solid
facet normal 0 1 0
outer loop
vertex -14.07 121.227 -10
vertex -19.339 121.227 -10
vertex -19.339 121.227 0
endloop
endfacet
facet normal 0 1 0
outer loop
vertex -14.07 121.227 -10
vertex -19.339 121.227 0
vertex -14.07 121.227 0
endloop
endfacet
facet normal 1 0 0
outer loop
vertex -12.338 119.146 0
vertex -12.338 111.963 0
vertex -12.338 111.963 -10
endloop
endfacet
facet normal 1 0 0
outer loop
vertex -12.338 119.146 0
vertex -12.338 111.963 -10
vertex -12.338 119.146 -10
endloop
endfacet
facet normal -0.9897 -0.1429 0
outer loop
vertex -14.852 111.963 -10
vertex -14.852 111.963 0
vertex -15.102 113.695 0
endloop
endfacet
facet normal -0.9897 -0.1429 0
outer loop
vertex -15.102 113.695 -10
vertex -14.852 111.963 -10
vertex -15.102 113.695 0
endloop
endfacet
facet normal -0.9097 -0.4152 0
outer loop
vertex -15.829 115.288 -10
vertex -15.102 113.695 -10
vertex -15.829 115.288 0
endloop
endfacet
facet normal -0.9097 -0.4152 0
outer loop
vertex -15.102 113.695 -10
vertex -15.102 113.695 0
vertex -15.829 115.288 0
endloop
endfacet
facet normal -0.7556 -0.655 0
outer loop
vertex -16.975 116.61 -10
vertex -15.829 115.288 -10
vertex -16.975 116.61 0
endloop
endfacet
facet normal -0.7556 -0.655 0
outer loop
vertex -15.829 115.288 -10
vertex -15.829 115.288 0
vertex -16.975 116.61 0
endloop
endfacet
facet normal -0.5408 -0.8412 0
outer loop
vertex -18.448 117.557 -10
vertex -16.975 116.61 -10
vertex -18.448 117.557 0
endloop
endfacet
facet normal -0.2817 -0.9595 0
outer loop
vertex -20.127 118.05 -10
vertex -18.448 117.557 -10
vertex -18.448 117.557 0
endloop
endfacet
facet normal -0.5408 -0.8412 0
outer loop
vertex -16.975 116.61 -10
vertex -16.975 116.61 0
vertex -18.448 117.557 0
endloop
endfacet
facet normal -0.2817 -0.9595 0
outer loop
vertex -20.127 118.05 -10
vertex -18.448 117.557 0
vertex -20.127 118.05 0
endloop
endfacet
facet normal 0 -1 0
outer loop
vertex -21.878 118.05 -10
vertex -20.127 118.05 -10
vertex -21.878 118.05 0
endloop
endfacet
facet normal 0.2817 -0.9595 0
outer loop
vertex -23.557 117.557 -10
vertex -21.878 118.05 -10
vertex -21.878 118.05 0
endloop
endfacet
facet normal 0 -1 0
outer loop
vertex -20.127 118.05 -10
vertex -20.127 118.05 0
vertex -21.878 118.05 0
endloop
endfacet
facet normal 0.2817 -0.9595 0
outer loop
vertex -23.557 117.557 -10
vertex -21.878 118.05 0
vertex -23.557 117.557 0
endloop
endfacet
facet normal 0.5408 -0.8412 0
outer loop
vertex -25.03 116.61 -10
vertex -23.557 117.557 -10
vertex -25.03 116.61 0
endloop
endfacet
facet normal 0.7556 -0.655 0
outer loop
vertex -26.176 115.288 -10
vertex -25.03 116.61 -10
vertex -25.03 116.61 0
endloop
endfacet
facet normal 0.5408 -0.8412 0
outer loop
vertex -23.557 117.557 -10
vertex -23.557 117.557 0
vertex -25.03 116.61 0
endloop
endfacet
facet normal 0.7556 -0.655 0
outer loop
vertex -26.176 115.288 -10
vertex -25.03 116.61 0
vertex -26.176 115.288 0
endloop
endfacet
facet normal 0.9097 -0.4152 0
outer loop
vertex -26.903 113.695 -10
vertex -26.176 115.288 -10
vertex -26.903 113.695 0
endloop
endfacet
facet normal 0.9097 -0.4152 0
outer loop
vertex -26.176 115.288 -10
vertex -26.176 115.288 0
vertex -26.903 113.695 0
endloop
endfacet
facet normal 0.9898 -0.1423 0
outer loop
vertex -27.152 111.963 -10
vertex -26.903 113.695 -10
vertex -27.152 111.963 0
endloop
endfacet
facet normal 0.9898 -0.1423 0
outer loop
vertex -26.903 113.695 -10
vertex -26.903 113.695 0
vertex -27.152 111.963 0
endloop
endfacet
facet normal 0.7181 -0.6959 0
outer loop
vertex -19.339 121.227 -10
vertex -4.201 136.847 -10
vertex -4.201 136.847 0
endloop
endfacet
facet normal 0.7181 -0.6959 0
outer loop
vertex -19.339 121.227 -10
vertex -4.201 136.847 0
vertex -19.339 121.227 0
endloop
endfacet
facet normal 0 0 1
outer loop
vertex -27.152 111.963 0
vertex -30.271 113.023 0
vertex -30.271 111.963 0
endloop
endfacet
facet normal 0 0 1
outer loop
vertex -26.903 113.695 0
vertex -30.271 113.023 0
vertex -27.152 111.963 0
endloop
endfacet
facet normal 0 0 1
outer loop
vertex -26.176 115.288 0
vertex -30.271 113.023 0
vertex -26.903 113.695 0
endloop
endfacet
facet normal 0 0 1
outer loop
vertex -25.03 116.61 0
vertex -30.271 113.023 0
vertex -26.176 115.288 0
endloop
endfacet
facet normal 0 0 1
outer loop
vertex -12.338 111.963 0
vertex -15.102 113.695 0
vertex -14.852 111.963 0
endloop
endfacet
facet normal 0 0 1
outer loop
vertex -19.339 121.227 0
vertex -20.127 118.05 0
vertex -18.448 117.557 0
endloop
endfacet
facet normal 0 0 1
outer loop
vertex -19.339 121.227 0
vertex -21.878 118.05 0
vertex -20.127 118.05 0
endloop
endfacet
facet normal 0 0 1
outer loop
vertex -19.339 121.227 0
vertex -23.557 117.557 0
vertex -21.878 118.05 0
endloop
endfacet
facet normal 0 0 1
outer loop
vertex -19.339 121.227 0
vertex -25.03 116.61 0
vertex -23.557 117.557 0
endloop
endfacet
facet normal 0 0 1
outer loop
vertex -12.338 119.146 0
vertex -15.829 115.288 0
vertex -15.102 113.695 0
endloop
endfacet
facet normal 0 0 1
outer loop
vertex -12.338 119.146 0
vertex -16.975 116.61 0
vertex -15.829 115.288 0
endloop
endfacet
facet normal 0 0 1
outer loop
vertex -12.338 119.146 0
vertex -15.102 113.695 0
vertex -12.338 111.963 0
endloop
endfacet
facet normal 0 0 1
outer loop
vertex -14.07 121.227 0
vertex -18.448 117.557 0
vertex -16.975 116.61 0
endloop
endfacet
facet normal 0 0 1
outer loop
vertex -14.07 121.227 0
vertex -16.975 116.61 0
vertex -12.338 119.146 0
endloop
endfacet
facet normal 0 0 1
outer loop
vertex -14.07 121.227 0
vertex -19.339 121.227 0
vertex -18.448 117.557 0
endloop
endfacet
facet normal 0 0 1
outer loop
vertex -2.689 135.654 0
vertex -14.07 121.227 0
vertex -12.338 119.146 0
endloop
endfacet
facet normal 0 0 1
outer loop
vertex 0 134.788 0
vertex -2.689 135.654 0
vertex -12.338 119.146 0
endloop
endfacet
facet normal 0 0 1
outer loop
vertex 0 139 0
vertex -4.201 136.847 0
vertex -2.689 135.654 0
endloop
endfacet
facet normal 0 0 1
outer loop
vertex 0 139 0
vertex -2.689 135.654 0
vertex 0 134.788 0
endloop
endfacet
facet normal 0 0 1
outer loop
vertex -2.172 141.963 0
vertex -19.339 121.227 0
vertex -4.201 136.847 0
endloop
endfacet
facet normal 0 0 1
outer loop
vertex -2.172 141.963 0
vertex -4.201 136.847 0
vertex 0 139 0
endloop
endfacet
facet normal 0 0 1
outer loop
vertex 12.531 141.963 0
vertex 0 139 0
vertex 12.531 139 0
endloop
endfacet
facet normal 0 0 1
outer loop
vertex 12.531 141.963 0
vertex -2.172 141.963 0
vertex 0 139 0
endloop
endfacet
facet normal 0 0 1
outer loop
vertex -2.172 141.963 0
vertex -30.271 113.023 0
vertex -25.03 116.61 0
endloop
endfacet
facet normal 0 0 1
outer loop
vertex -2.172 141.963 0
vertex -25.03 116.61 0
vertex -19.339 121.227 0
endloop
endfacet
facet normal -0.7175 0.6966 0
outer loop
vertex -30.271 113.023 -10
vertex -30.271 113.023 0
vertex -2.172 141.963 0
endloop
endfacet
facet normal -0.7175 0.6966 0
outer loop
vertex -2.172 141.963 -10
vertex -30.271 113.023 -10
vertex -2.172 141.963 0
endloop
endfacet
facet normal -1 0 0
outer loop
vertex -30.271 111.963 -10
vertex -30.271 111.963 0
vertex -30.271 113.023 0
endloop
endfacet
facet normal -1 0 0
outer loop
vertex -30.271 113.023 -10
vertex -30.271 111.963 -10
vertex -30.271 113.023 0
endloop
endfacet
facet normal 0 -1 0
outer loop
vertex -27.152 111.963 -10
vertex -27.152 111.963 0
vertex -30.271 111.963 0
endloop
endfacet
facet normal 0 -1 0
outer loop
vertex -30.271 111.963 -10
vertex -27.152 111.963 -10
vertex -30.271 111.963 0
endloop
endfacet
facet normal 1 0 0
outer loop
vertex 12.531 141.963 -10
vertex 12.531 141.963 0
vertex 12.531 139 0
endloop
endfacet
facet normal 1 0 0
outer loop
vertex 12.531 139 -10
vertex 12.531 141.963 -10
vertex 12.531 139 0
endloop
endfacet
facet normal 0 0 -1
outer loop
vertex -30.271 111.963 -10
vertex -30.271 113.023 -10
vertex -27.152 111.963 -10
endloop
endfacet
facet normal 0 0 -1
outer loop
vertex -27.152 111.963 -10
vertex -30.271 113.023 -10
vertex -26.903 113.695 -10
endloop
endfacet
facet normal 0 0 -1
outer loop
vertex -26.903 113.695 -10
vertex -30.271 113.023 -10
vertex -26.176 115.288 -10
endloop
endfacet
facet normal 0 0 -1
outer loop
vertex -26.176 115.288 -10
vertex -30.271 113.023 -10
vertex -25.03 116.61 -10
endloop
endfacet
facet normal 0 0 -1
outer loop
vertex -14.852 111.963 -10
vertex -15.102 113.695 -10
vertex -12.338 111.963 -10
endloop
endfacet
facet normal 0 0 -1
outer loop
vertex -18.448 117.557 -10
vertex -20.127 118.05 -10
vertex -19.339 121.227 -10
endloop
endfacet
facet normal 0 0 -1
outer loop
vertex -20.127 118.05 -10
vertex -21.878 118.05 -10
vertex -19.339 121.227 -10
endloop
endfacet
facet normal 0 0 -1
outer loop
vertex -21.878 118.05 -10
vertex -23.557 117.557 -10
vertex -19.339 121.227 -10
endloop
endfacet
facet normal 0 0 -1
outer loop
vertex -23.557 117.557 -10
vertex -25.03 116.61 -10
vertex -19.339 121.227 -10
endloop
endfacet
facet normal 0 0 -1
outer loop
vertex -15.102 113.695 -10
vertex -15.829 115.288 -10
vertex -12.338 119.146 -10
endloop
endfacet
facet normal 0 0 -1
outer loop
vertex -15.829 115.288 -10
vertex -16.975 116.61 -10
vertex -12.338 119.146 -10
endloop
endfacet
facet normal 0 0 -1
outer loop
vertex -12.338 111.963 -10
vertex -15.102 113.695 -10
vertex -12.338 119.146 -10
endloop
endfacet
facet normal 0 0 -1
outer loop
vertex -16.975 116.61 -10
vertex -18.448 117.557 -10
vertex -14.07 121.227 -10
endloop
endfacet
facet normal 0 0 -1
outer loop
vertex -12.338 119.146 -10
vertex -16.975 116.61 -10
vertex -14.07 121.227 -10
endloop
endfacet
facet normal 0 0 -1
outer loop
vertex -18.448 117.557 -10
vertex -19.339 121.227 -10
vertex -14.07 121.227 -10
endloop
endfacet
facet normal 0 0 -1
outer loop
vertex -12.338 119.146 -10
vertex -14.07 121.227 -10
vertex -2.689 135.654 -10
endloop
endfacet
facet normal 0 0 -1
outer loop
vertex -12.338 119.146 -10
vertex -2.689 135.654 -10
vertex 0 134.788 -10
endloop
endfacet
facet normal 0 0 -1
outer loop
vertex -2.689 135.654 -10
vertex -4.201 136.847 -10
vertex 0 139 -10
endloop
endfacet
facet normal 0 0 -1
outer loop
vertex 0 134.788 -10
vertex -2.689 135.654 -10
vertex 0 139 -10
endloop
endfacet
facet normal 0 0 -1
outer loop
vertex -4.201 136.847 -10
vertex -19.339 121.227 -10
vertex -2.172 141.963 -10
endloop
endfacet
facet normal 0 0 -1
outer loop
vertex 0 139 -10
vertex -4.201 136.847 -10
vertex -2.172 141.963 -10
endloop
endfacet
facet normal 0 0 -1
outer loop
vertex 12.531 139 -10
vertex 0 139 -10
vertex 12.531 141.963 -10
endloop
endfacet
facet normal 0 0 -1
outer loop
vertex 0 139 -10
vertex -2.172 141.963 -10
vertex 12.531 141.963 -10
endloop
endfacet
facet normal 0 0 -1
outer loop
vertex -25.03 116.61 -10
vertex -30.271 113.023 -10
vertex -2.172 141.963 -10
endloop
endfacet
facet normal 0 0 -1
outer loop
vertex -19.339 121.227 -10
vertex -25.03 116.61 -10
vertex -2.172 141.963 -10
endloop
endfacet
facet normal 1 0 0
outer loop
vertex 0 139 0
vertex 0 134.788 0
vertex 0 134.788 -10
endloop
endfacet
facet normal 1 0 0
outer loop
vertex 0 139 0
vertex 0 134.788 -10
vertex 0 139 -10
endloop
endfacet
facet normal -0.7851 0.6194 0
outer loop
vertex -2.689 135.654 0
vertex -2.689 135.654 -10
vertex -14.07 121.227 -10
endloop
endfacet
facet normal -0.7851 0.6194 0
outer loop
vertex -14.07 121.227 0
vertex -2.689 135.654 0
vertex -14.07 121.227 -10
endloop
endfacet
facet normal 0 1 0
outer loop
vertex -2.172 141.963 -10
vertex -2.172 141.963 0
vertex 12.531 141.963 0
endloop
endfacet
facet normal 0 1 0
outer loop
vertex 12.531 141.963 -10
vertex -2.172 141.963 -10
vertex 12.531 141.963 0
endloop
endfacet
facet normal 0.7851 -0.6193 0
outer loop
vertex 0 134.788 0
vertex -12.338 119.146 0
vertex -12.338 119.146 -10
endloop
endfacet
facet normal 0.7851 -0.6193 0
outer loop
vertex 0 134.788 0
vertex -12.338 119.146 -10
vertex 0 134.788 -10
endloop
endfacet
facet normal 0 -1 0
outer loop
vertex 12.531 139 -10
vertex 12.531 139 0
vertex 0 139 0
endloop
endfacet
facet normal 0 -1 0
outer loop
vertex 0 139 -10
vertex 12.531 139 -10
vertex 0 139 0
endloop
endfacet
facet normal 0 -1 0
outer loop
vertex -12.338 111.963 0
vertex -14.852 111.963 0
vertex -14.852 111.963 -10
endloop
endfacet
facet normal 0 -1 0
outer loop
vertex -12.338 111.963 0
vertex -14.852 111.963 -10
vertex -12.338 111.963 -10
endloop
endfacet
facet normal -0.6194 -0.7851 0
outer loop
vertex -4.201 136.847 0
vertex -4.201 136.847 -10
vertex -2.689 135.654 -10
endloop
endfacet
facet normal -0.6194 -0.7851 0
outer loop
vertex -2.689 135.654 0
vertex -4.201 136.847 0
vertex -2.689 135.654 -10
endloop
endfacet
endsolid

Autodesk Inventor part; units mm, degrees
ref_plane "YZ Plane" through (0, 0, 0) normal (1, 0, 0) x (0, 1, 0)
ref_plane "XZ Plane" through (0, 0, 0) normal (0, 1, 0) x (-1, 0, 0)
ref_plane "XY Plane" through (0, 0, 0) normal (0, 0, 1) x (1, 0, 0)
ref_plane "Arbeitsebene3" through (0, 0, 0) normal (0, 0, 1) x (1, 0, 0)
sketch "Skizze1" plane through (0, 0, 0) normal (0, 0, 1) x (1, 0, 0)
  circle A0 centre (871.1765, 73.7926) radius 2.6 construction
  circle A1 centre (881.1765, 21.442) radius 2.6 construction
  circle A2 centre (28.8235, 21.442) radius 2.6 construction
  circle A3 centre (38.8235, 73.7926) radius 2.6 construction
  line L0 (910, 0) -> (0, 0) construction
  line L1 (910, 0) -> (910, 139) construction
  line L2 (0, 139) -> (910, 139) construction
  line L3 (0, 0) -> (0, 139) construction
  circle A4 centre (-21.0024, 109.9626) radius 6 construction
  line L4 (0, 134.7877) -> (0, 139)
  line L5 (0, 141.9626) -> (-2.1715, 141.9626)
  line L6 (12.5314, 139) -> (0, 139)
  line L7 (0, 141.9626) -> (12.5314, 141.9626)
  line L8 (12.5314, 141.9626) -> (12.5314, 139)
  line L9 (-12.3384, 111.9626) -> (-12.3384, 119.1463)
  line L10 (-12.3384, 119.1463) -> (0, 134.7877)
  line L11 (-21.0024, 109.9626) -> (-21.0024, 111.9626) construction
  arc A5 (-14.8524, 111.9626) -> (-27.1524, 111.9626) centre (-21.0024, 111.9626) ccw
  line L12 (-30.2709, 111.9626) -> (-30.2709, 113.0226)
  line L13 (-30.2709, 113.0226) -> (-2.1715, 141.9626)
  arc A6 (-27.0706, 110.9626) -> (-27.1524, 111.9626) centre (-21.0024, 111.9626) ccw construction
  line L14 (-27.1524, 111.9626) -> (-30.2709, 111.9626)
  line L15 (-14.8524, 111.9626) -> (-12.3384, 111.9626)
extrude "Extrusion1" add sketch "Skizze1" against normal blind 10
sketch "Skizze2" plane through (0, 0, -10) normal (0, 0, -1) x (-1, 0, 0)
  line L0 (2.1715, 141.9626) -> (-12.5314, 141.9626) construction
  line L1 (-12.5314, 141.9626) -> (-12.5314, 139) construction
  line L2 (-12.5314, 139) -> (0, 139) construction
  line L3 (0, 139) -> (0, 134.7877) construction
  line L4 (0, 134.7877) -> (12.3384, 119.1463) construction
  line L5 (12.3384, 119.1463) -> (12.3384, 111.9626) construction
  line L6 (12.3384, 111.9626) -> (14.8524, 111.9626) construction
  arc A0 (27.1524, 111.9626) -> (14.8524, 111.9626) centre (21.0024, 111.9626) ccw construction
  line L7 (27.1524, 111.9626) -> (30.2709, 111.9626) construction
  line L8 (30.2709, 111.9626) -> (30.2709, 113.0226) construction
  line L9 (30.2709, 113.0226) -> (2.1715, 141.9626) construction
  line L10 (2.6888, 135.6545) -> (14.0699, 121.2268)
  line L11 (4.2009, 136.8473) -> (2.6888, 135.6545)
  line L12 (4.2009, 136.8473) -> (19.3387, 121.2268)
  line L13 (19.3387, 121.2268) -> (14.0699, 121.2268)
  point P0 (0, 0)
extrude "Extrusion2" cut sketch "Skizze2" against normal through all
properties part number "Lin_gage"
